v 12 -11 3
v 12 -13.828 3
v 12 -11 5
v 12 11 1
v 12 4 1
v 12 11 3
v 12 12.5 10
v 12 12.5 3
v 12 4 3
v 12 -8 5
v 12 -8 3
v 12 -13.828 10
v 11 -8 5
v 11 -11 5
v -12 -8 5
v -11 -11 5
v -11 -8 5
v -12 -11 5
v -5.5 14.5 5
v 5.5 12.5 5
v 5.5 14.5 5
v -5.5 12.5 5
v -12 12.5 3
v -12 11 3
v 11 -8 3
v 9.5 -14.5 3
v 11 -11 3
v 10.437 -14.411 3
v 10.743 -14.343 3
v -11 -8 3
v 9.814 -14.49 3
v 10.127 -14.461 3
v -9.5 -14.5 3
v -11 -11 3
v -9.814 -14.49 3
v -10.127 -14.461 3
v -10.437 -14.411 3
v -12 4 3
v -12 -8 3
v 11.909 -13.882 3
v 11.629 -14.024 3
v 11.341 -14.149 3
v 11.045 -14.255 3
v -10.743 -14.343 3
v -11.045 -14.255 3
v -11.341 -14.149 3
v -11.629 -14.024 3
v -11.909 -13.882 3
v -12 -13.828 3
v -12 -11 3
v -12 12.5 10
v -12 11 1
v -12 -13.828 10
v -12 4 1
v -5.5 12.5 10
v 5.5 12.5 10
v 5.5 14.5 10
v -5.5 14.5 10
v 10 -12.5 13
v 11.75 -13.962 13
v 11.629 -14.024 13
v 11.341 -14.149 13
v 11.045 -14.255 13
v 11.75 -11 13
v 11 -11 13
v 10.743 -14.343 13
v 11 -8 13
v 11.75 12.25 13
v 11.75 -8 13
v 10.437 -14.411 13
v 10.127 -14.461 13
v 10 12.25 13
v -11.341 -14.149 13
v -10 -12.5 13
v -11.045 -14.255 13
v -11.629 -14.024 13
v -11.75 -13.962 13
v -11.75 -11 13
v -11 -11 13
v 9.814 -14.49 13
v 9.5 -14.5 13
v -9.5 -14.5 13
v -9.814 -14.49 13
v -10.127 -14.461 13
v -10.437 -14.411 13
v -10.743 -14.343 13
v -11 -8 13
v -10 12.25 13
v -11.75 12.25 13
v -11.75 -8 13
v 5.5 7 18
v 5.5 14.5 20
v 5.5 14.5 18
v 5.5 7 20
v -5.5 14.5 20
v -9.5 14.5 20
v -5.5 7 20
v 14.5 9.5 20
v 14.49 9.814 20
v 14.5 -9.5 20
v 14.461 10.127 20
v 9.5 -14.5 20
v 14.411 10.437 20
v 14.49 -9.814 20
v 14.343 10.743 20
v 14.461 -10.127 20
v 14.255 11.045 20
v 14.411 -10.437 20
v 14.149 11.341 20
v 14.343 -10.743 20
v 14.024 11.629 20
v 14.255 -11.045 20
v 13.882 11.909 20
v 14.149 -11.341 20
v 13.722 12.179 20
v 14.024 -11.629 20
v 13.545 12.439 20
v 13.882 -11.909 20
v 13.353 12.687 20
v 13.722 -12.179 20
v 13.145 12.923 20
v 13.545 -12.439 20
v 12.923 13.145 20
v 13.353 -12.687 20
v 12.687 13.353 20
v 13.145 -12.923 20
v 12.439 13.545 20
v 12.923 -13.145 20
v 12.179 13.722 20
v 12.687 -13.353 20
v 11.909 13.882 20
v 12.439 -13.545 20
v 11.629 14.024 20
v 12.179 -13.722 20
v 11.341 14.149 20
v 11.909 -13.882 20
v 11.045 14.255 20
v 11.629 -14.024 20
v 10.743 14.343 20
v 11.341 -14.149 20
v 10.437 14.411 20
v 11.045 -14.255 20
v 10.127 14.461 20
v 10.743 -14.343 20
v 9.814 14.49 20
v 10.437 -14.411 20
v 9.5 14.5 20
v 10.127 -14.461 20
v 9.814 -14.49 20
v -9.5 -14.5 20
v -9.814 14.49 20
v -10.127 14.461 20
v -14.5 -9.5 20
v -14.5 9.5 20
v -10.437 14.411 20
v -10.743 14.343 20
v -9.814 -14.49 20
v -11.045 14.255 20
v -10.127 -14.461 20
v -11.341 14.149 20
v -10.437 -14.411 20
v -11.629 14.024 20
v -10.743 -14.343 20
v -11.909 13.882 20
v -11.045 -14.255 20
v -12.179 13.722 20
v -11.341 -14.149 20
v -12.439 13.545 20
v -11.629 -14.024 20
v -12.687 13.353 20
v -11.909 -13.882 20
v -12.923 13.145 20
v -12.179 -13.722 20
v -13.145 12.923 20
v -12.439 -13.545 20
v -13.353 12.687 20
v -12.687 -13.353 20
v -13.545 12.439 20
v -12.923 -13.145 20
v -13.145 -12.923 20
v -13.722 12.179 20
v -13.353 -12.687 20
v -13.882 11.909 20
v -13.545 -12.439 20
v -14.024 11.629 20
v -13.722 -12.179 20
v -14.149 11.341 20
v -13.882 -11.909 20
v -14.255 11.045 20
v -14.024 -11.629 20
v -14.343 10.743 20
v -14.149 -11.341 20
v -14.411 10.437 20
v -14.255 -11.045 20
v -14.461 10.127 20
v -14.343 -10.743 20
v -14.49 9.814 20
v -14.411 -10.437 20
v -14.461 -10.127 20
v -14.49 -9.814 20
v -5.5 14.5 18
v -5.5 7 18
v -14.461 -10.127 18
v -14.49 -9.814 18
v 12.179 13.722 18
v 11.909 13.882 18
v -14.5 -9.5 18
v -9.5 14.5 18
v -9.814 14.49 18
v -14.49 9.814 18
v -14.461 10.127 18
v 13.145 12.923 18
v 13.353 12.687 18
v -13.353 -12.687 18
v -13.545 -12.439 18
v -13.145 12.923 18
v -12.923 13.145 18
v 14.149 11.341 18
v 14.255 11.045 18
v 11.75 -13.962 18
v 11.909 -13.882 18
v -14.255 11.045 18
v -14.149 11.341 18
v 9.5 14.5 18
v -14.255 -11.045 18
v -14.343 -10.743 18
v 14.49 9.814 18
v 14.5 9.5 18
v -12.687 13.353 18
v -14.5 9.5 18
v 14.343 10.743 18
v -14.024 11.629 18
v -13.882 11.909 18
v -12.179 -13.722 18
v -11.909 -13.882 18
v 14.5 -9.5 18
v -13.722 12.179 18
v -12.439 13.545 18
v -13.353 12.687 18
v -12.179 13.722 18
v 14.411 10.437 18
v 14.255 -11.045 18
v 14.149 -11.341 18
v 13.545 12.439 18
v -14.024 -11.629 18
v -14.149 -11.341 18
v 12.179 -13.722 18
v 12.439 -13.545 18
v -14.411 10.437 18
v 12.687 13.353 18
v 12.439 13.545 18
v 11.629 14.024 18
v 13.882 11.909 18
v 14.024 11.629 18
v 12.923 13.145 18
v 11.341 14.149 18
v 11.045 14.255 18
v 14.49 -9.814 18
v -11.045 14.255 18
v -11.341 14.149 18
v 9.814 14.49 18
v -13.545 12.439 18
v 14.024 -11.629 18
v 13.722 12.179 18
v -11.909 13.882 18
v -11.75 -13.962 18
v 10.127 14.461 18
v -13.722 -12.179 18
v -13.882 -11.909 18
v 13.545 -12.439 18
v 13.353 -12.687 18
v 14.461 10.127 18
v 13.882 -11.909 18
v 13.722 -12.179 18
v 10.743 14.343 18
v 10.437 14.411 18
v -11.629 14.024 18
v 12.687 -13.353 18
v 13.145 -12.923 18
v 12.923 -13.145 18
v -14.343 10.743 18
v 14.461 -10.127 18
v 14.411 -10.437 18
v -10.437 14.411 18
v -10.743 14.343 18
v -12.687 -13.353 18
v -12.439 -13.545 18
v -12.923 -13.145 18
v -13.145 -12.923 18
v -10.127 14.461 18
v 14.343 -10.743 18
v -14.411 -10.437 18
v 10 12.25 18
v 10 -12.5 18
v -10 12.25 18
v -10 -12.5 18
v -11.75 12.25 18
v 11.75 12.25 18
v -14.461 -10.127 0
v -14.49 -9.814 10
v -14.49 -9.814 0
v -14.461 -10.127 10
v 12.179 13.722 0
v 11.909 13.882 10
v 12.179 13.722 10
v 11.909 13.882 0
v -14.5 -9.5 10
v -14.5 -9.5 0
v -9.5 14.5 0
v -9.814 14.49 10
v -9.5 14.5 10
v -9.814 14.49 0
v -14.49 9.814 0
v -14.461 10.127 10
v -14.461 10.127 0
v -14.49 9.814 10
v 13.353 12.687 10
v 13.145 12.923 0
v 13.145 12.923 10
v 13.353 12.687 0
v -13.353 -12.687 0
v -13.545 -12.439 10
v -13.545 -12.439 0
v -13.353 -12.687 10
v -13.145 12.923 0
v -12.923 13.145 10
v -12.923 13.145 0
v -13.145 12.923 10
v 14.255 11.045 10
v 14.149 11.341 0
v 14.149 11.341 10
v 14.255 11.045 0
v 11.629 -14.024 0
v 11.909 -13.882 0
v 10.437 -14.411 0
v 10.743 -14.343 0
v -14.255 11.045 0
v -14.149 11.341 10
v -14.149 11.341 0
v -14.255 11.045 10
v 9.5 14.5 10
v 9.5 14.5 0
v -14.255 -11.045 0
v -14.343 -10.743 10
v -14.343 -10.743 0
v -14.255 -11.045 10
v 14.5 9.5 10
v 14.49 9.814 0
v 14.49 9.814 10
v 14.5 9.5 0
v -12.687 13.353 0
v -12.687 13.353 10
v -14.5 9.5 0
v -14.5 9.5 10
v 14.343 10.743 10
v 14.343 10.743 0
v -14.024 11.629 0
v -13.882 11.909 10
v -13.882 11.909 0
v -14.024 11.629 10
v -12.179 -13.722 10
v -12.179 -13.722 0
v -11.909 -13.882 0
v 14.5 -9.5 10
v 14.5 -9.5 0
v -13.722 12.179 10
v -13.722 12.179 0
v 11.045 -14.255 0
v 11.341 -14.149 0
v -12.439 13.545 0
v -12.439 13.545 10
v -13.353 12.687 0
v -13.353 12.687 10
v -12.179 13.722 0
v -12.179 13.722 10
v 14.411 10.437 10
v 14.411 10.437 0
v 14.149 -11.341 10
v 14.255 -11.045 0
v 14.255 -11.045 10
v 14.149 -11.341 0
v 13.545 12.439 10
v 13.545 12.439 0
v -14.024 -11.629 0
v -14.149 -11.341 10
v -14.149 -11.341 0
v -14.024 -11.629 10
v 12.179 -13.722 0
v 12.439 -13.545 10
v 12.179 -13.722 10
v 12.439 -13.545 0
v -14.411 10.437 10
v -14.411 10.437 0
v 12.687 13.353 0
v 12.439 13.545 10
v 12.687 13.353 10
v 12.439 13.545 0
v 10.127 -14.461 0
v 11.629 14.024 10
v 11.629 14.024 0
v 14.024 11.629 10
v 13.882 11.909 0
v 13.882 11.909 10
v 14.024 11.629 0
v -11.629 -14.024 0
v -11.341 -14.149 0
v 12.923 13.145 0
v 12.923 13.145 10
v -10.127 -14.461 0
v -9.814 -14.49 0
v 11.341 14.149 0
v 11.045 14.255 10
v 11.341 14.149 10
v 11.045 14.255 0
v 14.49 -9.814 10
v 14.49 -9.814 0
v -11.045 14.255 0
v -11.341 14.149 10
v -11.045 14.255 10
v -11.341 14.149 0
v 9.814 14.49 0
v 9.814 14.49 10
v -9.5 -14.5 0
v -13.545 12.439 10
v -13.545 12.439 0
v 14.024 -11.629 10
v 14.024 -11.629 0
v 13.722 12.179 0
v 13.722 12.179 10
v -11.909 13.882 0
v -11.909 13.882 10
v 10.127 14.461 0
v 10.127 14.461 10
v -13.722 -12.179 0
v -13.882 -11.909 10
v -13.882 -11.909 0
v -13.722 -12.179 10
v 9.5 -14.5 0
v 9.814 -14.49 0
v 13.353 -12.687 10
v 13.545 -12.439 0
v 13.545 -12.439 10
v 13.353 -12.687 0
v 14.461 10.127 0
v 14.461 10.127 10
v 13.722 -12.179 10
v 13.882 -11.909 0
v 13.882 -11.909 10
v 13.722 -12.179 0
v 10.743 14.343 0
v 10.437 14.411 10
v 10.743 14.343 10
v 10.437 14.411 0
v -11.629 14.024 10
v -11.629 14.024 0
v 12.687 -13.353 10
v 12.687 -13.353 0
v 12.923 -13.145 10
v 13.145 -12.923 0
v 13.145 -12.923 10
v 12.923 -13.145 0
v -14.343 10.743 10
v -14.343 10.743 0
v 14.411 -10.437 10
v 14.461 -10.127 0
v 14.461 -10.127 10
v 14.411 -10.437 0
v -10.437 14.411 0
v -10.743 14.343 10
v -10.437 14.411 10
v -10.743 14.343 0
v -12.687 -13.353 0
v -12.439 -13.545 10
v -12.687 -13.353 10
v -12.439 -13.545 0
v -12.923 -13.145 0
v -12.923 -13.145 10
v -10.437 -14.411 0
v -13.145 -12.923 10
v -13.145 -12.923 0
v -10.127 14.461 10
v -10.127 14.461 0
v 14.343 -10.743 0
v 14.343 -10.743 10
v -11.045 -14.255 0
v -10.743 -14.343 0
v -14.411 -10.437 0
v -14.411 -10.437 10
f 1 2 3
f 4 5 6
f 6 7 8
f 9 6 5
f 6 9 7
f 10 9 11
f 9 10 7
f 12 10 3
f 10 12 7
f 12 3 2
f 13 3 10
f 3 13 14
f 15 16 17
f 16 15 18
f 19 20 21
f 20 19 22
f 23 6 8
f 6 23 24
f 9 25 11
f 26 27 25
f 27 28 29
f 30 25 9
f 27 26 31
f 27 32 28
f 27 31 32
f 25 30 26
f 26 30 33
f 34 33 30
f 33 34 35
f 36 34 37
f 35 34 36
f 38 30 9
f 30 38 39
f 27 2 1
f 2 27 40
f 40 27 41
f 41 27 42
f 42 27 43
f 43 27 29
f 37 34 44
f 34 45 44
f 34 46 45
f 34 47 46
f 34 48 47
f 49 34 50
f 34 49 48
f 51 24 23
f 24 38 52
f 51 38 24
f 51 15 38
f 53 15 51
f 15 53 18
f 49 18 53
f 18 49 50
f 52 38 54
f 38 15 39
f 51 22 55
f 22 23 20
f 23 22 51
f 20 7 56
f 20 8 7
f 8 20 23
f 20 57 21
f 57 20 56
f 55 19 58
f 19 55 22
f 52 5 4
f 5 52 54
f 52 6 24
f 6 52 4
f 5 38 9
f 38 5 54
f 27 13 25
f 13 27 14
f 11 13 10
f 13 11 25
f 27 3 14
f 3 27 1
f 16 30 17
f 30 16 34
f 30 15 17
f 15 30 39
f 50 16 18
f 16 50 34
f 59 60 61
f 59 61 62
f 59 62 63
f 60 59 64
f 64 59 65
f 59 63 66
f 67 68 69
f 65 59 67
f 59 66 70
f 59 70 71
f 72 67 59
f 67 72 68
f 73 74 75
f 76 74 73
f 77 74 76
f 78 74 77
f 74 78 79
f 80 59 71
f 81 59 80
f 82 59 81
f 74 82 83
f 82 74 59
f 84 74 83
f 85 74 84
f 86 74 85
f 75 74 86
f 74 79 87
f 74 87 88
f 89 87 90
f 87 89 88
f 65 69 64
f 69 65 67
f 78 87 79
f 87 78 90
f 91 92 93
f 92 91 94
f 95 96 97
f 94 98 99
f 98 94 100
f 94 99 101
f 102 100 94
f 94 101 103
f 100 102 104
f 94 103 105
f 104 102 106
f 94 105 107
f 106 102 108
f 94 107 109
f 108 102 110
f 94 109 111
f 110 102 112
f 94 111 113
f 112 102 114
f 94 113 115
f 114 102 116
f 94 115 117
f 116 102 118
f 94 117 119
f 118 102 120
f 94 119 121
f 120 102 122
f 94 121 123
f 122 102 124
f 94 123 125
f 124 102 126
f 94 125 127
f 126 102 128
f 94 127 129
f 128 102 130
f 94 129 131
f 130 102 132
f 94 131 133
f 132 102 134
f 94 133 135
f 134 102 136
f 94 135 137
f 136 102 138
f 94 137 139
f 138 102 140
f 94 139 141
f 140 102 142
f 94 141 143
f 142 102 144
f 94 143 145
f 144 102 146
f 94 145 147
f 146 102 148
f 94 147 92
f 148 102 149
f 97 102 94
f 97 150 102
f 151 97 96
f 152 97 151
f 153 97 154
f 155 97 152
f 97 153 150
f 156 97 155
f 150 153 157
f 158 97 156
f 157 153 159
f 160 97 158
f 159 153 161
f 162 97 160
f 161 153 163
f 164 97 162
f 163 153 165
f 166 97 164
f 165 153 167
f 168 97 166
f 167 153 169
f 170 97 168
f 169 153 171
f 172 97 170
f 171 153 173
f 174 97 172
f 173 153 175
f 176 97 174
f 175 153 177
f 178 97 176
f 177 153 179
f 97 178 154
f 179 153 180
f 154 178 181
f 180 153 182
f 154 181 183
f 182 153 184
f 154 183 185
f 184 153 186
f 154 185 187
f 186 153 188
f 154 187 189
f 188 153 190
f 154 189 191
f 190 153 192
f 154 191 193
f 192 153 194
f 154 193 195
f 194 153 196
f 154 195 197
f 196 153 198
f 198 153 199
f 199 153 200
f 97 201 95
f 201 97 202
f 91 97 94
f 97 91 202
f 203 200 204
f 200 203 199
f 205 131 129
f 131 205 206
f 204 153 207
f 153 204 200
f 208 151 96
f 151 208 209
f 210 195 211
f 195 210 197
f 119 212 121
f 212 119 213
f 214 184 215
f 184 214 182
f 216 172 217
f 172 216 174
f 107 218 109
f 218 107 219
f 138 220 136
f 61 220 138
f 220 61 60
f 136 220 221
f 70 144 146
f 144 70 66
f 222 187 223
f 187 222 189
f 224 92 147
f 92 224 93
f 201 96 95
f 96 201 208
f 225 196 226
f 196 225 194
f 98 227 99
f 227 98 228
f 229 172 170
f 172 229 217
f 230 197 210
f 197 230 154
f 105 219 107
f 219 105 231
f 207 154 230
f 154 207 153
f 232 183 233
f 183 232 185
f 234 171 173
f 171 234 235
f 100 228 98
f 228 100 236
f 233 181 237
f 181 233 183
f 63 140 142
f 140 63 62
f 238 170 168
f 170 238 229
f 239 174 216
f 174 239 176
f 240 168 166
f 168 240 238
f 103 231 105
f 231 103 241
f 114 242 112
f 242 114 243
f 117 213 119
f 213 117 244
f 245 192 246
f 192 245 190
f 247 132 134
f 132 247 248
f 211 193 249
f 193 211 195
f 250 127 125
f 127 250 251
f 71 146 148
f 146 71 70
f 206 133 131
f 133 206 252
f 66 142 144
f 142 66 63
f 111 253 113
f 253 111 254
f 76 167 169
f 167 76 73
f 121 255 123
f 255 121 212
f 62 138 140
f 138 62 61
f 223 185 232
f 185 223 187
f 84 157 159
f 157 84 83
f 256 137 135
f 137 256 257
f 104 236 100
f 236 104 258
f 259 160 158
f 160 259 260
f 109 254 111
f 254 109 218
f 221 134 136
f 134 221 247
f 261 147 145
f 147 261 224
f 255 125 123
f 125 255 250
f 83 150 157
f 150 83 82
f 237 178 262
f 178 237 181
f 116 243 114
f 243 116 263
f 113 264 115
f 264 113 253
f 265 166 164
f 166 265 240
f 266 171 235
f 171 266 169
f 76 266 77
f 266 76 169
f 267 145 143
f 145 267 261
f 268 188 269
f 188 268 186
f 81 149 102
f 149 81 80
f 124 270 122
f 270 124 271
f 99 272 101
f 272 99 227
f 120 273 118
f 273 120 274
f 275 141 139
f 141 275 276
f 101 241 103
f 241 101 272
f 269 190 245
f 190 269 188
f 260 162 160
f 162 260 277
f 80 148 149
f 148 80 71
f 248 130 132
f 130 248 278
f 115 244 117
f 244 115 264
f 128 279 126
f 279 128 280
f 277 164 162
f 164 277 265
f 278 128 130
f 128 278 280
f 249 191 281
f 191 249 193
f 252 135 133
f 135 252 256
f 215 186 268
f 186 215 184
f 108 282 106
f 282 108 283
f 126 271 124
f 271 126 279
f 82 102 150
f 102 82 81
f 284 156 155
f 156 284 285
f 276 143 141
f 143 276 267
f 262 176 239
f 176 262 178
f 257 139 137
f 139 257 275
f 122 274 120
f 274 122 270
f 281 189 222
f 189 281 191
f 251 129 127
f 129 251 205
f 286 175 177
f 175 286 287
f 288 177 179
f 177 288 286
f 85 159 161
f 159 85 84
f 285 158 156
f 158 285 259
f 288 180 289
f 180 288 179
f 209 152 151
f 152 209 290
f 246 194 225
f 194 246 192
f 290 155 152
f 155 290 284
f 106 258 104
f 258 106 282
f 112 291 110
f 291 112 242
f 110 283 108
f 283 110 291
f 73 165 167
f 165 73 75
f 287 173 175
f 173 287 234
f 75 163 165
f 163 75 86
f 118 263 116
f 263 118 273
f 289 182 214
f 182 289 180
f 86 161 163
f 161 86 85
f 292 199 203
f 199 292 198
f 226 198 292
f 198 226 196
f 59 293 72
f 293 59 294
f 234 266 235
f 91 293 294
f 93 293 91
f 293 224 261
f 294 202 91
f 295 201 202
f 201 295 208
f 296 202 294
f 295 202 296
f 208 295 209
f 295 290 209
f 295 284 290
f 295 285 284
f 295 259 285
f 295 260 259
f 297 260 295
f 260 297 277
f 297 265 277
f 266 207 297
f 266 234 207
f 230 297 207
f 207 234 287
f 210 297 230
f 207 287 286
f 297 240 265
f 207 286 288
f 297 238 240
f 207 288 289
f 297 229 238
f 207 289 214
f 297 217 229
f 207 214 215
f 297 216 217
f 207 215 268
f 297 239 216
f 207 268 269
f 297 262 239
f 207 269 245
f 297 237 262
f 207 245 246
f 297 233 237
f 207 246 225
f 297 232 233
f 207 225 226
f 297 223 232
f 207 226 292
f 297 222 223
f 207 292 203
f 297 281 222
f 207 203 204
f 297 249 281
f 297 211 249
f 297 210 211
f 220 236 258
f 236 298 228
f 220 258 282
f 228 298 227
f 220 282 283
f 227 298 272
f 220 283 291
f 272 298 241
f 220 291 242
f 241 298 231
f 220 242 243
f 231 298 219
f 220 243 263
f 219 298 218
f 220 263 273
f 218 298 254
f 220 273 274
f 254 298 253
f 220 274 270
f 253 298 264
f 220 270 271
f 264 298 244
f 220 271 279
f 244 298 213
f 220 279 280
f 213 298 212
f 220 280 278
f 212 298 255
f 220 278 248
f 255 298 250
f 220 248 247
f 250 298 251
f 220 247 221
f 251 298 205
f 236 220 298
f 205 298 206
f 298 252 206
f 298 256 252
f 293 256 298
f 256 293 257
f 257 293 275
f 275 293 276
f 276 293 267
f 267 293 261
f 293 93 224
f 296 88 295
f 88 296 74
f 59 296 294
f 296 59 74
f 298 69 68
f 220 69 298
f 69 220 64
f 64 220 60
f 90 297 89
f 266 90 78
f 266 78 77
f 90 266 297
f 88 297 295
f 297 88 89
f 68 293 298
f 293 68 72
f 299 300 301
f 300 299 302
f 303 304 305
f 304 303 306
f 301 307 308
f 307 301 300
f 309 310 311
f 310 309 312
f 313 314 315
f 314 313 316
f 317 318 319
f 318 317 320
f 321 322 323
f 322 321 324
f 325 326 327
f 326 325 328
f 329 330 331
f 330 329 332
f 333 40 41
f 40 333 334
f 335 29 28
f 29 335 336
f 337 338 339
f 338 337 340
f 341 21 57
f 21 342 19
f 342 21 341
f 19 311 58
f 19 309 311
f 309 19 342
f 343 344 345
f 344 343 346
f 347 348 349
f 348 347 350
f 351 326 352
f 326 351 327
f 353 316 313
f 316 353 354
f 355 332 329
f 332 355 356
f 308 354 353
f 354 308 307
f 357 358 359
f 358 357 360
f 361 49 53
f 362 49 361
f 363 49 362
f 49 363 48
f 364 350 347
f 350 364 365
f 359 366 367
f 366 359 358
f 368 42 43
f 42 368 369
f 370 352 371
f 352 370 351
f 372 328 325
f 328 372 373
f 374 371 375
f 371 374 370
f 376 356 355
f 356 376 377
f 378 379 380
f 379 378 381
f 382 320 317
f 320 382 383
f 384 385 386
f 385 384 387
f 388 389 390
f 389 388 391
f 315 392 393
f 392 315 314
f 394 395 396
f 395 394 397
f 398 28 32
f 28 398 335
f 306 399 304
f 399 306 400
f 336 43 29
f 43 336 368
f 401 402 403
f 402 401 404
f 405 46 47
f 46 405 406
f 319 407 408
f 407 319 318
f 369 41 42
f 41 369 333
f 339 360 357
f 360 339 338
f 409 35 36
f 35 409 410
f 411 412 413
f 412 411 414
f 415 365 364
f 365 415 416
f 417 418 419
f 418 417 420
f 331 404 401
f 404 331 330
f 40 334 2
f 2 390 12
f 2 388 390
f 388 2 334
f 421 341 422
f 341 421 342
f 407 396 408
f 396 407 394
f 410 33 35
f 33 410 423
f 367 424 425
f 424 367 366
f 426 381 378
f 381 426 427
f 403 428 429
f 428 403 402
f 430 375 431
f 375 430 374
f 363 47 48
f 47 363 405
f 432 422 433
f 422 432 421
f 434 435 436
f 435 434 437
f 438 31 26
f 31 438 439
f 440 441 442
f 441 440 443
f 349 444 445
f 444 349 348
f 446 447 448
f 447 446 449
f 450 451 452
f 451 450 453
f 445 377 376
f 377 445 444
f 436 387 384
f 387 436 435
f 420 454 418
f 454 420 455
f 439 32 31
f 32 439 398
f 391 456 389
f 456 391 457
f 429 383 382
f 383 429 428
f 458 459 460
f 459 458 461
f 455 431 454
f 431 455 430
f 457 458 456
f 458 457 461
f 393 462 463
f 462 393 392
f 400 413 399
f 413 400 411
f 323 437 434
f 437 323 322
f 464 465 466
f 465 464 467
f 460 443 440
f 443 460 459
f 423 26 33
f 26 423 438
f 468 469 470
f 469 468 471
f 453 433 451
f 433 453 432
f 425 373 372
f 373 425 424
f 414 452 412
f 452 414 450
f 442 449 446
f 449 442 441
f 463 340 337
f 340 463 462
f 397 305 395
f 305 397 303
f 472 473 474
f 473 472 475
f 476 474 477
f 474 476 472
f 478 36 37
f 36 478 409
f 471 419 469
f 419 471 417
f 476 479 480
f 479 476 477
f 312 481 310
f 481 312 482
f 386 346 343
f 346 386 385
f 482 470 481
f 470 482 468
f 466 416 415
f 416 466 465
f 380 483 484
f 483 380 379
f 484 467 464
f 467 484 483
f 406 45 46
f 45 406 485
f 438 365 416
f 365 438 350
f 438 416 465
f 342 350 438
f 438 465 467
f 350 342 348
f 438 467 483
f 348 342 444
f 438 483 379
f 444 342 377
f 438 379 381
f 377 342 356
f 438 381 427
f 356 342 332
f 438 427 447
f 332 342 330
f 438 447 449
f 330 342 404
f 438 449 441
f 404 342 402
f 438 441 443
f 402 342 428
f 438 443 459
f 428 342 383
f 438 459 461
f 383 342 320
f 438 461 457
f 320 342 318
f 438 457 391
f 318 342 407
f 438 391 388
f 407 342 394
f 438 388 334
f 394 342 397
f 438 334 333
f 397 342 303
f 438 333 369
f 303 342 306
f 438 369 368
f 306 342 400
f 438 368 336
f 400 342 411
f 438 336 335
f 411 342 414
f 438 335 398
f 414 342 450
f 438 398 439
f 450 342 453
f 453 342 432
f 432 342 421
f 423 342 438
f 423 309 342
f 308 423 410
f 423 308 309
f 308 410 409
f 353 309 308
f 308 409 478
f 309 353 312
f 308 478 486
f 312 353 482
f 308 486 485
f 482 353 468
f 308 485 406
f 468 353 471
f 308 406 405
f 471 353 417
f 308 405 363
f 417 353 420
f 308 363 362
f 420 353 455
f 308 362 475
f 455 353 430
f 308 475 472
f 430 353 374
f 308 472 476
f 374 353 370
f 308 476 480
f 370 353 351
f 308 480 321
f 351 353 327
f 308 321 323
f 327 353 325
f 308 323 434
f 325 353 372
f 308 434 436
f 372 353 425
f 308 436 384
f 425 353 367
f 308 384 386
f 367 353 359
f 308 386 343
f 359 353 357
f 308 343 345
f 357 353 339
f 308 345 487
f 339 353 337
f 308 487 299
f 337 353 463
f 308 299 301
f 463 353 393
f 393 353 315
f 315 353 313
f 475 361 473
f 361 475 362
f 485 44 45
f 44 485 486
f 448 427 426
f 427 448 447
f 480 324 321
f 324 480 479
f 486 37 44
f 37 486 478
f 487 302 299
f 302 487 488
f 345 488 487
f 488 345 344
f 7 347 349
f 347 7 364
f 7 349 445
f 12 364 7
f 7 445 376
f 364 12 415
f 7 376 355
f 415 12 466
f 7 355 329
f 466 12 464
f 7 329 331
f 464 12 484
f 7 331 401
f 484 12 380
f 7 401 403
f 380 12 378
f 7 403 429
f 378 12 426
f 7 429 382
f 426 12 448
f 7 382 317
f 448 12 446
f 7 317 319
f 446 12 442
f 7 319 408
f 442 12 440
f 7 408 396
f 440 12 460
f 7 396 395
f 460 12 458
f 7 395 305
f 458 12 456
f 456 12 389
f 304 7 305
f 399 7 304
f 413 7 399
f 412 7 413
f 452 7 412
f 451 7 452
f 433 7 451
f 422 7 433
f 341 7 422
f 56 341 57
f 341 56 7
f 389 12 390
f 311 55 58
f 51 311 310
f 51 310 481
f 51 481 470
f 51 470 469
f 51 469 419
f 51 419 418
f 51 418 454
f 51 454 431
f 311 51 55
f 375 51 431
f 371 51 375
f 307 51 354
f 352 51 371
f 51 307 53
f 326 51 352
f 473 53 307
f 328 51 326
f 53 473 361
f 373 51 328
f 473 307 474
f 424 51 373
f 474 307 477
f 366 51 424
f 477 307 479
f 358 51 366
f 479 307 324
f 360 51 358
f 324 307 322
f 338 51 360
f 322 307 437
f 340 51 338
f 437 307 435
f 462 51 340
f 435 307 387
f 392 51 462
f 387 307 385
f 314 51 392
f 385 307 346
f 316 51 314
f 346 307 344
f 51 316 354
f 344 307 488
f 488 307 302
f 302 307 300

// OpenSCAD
/*
 width = x
 depth = y
 height = z
*/

/* Housing related parameter */
PCBWiggleRoom = 1.0;
HousingWiggleRoom = 0.5;

HousingWidth = 29.0;
HousingDepth = HousingWidth;
HousingHeight = 12;
HousingCornerRadius = 5.0;
HousingWallWidth = 2.0; /* Top and buttom wall width */
HousingPCBHeightOffset = 1;

/* Sensor related parameter */
PCBWidth = 23 + PCBWiggleRoom;
PCBDepth = 98.0 + PCBWiggleRoom;
PCBHeight = 1.0 + PCBWiggleRoom;
PCBNotch_y = 21.0 + PCBWiggleRoom; /* center of notch */
PCBNotchWidth = 2.0 - PCBWiggleRoom;
PCBNotchDepth = 4.0 - PCBWiggleRoom;
PCBNotchHeight = 2.0;
PCBConnectorWidth = 10.0 + PCBWiggleRoom;
PCBConnectorDepth = 10.0 + PCBWiggleRoom;
PCBConnectorHeight = 6.0 + PCBWiggleRoom;
PCBConnectorPinsWidth = PCBWidth;
PCBConnectorPinsDepth = 7.0;
PCBConnectorPinsHeight = 2.0;
PCBConnectorPins_y = 5.0; /* center of pins */


translate([0, 0, 8])
color("LawnGreen")
sensorHousingUpper($fn=100); 


color("DeepSkyBlue")
sensorHousingLower($fn=100);

//translate([0, -PCBDepth/2 + HousingDepth/2 - HousingWallWidth, HousingWallWidth + HousingPCBHeightOffset])
//    capacitiveSoilSensor();


module sensorHousingUpper()
{
    difference()
    {
        translate ([0, 0, HousingWallWidth + HousingPCBHeightOffset + PCBHeight])
        linear_extrude(height = HousingHeight - HousingWallWidth - HousingPCBHeightOffset - PCBHeight)
        hull()
        {
            translate([(HousingWidth/2 - HousingCornerRadius), (HousingDepth/2 - HousingCornerRadius), 0])
                circle(r = HousingCornerRadius);
            translate([-(HousingWidth/2 - HousingCornerRadius), (HousingDepth/2 - HousingCornerRadius), 0])
                circle(r = HousingCornerRadius);
            translate([(HousingWidth/2 - HousingCornerRadius), -(HousingDepth/2 - HousingCornerRadius), 0])
                circle(r = HousingCornerRadius);
            translate([-(HousingWidth/2 - HousingCornerRadius), -(HousingDepth/2 - HousingCornerRadius), 0])
                circle(r = HousingCornerRadius);
        }
        
        translate([0, -PCBDepth/2 + HousingDepth/2 - HousingWallWidth, HousingWallWidth + HousingPCBHeightOffset])
            capacitiveSoilSensor();
        
        SpaceAbovePCB = HousingHeight - 2 * HousingWallWidth - HousingPCBHeightOffset - PCBHeight;
        translate ([0, HousingWallWidth, (SpaceAbovePCB)/2 + HousingWallWidth + HousingPCBHeightOffset + PCBHeight])
            cube([PCBWidth - 2 * HousingWallWidth, HousingDepth, SpaceAbovePCB], center = true);
        translate([(HousingWidth + HousingWallWidth)/2, 0, HousingWallWidth])
            cube([HousingWallWidth, HousingDepth, SpaceAbovePCB], center = true);

        translate([(HousingWidth - PCBWidth)/4 + PCBWidth/2, 0, -SpaceAbovePCB/2 + HousingHeight - HousingWallWidth])
            cube([(HousingWidth - PCBWidth)/2 + HousingWiggleRoom, HousingDepth, SpaceAbovePCB], center = true);
        translate([-((HousingWidth - PCBWidth)/4 + PCBWidth/2), 0, -SpaceAbovePCB/2 + HousingHeight - HousingWallWidth])
            cube([(HousingWidth - PCBWidth)/2 + HousingWiggleRoom, HousingDepth, SpaceAbovePCB], center = true);
        translate([0, (HousingDepth - HousingWallWidth)/2,  -SpaceAbovePCB/2 + HousingHeight - HousingWallWidth])
            cube([HousingWidth, HousingWallWidth + HousingWiggleRoom, SpaceAbovePCB], center = true);
    }
}
            
module sensorHousingLower()
{
    difference()
    {
        linear_extrude(height = HousingHeight - HousingWallWidth)
        hull()
        {
            translate([(HousingWidth/2 - HousingCornerRadius), (HousingDepth/2 - HousingCornerRadius), 0])
                circle(r = HousingCornerRadius);
            translate([-(HousingWidth/2 - HousingCornerRadius), (HousingDepth/2 - HousingCornerRadius), 0])
                circle(r = HousingCornerRadius);
            translate([(HousingWidth/2 - HousingCornerRadius), -(HousingDepth/2 - HousingCornerRadius), 0])
                circle(r = HousingCornerRadius);
            translate([-(HousingWidth/2 - HousingCornerRadius), -(HousingDepth/2 - HousingCornerRadius), 0])
                circle(r = HousingCornerRadius);
        }
        
        translate([0, -PCBDepth/2 + HousingDepth/2 - HousingWallWidth, HousingWallWidth + HousingPCBHeightOffset])
          capacitiveSoilSensor();
        
        SpaceAbovePCB = HousingHeight - 2 * HousingWallWidth - HousingPCBHeightOffset - PCBHeight;
        translate ([0, -HousingWallWidth, (SpaceAbovePCB)/2 + HousingWallWidth + HousingPCBHeightOffset + PCBHeight])
          cube([PCBWidth, HousingDepth, SpaceAbovePCB], center = true);
    }
}



module capacitiveSoilSensor()
{
    difference()
    {
        /* PCB and connector */
        union()
        {
            translate([0, 0, PCBHeight/2])
            {
                cube ([PCBWidth, PCBDepth, PCBHeight], center=true);
                translate([0, PCBDepth/2, PCBConnectorHeight/2 + PCBHeight/2 ])
                    cube ([PCBConnectorWidth, PCBConnectorDepth, PCBConnectorHeight], center=true);
                translate([0, PCBDepth/2 - PCBConnectorPins_y, -PCBConnectorPinsHeight/2 - PCBHeight/2])
                    cube([PCBConnectorPinsWidth, PCBConnectorPinsDepth, PCBConnectorPinsHeight], center =true);
            }
        }
        translate([PCBWidth/2 - PCBNotchWidth/2, PCBDepth/2 - PCBNotch_y, PCBHeight/2])
        {
            cube([PCBNotchWidth, PCBNotchDepth, PCBNotchHeight], center=true);
        }
        translate([- (PCBWidth/2 - PCBNotchWidth/2), PCBDepth/2 - PCBNotch_y, PCBHeight/2])
        {
            cube([PCBNotchWidth, PCBNotchDepth, PCBNotchHeight], center=true);
        }
    }
}
